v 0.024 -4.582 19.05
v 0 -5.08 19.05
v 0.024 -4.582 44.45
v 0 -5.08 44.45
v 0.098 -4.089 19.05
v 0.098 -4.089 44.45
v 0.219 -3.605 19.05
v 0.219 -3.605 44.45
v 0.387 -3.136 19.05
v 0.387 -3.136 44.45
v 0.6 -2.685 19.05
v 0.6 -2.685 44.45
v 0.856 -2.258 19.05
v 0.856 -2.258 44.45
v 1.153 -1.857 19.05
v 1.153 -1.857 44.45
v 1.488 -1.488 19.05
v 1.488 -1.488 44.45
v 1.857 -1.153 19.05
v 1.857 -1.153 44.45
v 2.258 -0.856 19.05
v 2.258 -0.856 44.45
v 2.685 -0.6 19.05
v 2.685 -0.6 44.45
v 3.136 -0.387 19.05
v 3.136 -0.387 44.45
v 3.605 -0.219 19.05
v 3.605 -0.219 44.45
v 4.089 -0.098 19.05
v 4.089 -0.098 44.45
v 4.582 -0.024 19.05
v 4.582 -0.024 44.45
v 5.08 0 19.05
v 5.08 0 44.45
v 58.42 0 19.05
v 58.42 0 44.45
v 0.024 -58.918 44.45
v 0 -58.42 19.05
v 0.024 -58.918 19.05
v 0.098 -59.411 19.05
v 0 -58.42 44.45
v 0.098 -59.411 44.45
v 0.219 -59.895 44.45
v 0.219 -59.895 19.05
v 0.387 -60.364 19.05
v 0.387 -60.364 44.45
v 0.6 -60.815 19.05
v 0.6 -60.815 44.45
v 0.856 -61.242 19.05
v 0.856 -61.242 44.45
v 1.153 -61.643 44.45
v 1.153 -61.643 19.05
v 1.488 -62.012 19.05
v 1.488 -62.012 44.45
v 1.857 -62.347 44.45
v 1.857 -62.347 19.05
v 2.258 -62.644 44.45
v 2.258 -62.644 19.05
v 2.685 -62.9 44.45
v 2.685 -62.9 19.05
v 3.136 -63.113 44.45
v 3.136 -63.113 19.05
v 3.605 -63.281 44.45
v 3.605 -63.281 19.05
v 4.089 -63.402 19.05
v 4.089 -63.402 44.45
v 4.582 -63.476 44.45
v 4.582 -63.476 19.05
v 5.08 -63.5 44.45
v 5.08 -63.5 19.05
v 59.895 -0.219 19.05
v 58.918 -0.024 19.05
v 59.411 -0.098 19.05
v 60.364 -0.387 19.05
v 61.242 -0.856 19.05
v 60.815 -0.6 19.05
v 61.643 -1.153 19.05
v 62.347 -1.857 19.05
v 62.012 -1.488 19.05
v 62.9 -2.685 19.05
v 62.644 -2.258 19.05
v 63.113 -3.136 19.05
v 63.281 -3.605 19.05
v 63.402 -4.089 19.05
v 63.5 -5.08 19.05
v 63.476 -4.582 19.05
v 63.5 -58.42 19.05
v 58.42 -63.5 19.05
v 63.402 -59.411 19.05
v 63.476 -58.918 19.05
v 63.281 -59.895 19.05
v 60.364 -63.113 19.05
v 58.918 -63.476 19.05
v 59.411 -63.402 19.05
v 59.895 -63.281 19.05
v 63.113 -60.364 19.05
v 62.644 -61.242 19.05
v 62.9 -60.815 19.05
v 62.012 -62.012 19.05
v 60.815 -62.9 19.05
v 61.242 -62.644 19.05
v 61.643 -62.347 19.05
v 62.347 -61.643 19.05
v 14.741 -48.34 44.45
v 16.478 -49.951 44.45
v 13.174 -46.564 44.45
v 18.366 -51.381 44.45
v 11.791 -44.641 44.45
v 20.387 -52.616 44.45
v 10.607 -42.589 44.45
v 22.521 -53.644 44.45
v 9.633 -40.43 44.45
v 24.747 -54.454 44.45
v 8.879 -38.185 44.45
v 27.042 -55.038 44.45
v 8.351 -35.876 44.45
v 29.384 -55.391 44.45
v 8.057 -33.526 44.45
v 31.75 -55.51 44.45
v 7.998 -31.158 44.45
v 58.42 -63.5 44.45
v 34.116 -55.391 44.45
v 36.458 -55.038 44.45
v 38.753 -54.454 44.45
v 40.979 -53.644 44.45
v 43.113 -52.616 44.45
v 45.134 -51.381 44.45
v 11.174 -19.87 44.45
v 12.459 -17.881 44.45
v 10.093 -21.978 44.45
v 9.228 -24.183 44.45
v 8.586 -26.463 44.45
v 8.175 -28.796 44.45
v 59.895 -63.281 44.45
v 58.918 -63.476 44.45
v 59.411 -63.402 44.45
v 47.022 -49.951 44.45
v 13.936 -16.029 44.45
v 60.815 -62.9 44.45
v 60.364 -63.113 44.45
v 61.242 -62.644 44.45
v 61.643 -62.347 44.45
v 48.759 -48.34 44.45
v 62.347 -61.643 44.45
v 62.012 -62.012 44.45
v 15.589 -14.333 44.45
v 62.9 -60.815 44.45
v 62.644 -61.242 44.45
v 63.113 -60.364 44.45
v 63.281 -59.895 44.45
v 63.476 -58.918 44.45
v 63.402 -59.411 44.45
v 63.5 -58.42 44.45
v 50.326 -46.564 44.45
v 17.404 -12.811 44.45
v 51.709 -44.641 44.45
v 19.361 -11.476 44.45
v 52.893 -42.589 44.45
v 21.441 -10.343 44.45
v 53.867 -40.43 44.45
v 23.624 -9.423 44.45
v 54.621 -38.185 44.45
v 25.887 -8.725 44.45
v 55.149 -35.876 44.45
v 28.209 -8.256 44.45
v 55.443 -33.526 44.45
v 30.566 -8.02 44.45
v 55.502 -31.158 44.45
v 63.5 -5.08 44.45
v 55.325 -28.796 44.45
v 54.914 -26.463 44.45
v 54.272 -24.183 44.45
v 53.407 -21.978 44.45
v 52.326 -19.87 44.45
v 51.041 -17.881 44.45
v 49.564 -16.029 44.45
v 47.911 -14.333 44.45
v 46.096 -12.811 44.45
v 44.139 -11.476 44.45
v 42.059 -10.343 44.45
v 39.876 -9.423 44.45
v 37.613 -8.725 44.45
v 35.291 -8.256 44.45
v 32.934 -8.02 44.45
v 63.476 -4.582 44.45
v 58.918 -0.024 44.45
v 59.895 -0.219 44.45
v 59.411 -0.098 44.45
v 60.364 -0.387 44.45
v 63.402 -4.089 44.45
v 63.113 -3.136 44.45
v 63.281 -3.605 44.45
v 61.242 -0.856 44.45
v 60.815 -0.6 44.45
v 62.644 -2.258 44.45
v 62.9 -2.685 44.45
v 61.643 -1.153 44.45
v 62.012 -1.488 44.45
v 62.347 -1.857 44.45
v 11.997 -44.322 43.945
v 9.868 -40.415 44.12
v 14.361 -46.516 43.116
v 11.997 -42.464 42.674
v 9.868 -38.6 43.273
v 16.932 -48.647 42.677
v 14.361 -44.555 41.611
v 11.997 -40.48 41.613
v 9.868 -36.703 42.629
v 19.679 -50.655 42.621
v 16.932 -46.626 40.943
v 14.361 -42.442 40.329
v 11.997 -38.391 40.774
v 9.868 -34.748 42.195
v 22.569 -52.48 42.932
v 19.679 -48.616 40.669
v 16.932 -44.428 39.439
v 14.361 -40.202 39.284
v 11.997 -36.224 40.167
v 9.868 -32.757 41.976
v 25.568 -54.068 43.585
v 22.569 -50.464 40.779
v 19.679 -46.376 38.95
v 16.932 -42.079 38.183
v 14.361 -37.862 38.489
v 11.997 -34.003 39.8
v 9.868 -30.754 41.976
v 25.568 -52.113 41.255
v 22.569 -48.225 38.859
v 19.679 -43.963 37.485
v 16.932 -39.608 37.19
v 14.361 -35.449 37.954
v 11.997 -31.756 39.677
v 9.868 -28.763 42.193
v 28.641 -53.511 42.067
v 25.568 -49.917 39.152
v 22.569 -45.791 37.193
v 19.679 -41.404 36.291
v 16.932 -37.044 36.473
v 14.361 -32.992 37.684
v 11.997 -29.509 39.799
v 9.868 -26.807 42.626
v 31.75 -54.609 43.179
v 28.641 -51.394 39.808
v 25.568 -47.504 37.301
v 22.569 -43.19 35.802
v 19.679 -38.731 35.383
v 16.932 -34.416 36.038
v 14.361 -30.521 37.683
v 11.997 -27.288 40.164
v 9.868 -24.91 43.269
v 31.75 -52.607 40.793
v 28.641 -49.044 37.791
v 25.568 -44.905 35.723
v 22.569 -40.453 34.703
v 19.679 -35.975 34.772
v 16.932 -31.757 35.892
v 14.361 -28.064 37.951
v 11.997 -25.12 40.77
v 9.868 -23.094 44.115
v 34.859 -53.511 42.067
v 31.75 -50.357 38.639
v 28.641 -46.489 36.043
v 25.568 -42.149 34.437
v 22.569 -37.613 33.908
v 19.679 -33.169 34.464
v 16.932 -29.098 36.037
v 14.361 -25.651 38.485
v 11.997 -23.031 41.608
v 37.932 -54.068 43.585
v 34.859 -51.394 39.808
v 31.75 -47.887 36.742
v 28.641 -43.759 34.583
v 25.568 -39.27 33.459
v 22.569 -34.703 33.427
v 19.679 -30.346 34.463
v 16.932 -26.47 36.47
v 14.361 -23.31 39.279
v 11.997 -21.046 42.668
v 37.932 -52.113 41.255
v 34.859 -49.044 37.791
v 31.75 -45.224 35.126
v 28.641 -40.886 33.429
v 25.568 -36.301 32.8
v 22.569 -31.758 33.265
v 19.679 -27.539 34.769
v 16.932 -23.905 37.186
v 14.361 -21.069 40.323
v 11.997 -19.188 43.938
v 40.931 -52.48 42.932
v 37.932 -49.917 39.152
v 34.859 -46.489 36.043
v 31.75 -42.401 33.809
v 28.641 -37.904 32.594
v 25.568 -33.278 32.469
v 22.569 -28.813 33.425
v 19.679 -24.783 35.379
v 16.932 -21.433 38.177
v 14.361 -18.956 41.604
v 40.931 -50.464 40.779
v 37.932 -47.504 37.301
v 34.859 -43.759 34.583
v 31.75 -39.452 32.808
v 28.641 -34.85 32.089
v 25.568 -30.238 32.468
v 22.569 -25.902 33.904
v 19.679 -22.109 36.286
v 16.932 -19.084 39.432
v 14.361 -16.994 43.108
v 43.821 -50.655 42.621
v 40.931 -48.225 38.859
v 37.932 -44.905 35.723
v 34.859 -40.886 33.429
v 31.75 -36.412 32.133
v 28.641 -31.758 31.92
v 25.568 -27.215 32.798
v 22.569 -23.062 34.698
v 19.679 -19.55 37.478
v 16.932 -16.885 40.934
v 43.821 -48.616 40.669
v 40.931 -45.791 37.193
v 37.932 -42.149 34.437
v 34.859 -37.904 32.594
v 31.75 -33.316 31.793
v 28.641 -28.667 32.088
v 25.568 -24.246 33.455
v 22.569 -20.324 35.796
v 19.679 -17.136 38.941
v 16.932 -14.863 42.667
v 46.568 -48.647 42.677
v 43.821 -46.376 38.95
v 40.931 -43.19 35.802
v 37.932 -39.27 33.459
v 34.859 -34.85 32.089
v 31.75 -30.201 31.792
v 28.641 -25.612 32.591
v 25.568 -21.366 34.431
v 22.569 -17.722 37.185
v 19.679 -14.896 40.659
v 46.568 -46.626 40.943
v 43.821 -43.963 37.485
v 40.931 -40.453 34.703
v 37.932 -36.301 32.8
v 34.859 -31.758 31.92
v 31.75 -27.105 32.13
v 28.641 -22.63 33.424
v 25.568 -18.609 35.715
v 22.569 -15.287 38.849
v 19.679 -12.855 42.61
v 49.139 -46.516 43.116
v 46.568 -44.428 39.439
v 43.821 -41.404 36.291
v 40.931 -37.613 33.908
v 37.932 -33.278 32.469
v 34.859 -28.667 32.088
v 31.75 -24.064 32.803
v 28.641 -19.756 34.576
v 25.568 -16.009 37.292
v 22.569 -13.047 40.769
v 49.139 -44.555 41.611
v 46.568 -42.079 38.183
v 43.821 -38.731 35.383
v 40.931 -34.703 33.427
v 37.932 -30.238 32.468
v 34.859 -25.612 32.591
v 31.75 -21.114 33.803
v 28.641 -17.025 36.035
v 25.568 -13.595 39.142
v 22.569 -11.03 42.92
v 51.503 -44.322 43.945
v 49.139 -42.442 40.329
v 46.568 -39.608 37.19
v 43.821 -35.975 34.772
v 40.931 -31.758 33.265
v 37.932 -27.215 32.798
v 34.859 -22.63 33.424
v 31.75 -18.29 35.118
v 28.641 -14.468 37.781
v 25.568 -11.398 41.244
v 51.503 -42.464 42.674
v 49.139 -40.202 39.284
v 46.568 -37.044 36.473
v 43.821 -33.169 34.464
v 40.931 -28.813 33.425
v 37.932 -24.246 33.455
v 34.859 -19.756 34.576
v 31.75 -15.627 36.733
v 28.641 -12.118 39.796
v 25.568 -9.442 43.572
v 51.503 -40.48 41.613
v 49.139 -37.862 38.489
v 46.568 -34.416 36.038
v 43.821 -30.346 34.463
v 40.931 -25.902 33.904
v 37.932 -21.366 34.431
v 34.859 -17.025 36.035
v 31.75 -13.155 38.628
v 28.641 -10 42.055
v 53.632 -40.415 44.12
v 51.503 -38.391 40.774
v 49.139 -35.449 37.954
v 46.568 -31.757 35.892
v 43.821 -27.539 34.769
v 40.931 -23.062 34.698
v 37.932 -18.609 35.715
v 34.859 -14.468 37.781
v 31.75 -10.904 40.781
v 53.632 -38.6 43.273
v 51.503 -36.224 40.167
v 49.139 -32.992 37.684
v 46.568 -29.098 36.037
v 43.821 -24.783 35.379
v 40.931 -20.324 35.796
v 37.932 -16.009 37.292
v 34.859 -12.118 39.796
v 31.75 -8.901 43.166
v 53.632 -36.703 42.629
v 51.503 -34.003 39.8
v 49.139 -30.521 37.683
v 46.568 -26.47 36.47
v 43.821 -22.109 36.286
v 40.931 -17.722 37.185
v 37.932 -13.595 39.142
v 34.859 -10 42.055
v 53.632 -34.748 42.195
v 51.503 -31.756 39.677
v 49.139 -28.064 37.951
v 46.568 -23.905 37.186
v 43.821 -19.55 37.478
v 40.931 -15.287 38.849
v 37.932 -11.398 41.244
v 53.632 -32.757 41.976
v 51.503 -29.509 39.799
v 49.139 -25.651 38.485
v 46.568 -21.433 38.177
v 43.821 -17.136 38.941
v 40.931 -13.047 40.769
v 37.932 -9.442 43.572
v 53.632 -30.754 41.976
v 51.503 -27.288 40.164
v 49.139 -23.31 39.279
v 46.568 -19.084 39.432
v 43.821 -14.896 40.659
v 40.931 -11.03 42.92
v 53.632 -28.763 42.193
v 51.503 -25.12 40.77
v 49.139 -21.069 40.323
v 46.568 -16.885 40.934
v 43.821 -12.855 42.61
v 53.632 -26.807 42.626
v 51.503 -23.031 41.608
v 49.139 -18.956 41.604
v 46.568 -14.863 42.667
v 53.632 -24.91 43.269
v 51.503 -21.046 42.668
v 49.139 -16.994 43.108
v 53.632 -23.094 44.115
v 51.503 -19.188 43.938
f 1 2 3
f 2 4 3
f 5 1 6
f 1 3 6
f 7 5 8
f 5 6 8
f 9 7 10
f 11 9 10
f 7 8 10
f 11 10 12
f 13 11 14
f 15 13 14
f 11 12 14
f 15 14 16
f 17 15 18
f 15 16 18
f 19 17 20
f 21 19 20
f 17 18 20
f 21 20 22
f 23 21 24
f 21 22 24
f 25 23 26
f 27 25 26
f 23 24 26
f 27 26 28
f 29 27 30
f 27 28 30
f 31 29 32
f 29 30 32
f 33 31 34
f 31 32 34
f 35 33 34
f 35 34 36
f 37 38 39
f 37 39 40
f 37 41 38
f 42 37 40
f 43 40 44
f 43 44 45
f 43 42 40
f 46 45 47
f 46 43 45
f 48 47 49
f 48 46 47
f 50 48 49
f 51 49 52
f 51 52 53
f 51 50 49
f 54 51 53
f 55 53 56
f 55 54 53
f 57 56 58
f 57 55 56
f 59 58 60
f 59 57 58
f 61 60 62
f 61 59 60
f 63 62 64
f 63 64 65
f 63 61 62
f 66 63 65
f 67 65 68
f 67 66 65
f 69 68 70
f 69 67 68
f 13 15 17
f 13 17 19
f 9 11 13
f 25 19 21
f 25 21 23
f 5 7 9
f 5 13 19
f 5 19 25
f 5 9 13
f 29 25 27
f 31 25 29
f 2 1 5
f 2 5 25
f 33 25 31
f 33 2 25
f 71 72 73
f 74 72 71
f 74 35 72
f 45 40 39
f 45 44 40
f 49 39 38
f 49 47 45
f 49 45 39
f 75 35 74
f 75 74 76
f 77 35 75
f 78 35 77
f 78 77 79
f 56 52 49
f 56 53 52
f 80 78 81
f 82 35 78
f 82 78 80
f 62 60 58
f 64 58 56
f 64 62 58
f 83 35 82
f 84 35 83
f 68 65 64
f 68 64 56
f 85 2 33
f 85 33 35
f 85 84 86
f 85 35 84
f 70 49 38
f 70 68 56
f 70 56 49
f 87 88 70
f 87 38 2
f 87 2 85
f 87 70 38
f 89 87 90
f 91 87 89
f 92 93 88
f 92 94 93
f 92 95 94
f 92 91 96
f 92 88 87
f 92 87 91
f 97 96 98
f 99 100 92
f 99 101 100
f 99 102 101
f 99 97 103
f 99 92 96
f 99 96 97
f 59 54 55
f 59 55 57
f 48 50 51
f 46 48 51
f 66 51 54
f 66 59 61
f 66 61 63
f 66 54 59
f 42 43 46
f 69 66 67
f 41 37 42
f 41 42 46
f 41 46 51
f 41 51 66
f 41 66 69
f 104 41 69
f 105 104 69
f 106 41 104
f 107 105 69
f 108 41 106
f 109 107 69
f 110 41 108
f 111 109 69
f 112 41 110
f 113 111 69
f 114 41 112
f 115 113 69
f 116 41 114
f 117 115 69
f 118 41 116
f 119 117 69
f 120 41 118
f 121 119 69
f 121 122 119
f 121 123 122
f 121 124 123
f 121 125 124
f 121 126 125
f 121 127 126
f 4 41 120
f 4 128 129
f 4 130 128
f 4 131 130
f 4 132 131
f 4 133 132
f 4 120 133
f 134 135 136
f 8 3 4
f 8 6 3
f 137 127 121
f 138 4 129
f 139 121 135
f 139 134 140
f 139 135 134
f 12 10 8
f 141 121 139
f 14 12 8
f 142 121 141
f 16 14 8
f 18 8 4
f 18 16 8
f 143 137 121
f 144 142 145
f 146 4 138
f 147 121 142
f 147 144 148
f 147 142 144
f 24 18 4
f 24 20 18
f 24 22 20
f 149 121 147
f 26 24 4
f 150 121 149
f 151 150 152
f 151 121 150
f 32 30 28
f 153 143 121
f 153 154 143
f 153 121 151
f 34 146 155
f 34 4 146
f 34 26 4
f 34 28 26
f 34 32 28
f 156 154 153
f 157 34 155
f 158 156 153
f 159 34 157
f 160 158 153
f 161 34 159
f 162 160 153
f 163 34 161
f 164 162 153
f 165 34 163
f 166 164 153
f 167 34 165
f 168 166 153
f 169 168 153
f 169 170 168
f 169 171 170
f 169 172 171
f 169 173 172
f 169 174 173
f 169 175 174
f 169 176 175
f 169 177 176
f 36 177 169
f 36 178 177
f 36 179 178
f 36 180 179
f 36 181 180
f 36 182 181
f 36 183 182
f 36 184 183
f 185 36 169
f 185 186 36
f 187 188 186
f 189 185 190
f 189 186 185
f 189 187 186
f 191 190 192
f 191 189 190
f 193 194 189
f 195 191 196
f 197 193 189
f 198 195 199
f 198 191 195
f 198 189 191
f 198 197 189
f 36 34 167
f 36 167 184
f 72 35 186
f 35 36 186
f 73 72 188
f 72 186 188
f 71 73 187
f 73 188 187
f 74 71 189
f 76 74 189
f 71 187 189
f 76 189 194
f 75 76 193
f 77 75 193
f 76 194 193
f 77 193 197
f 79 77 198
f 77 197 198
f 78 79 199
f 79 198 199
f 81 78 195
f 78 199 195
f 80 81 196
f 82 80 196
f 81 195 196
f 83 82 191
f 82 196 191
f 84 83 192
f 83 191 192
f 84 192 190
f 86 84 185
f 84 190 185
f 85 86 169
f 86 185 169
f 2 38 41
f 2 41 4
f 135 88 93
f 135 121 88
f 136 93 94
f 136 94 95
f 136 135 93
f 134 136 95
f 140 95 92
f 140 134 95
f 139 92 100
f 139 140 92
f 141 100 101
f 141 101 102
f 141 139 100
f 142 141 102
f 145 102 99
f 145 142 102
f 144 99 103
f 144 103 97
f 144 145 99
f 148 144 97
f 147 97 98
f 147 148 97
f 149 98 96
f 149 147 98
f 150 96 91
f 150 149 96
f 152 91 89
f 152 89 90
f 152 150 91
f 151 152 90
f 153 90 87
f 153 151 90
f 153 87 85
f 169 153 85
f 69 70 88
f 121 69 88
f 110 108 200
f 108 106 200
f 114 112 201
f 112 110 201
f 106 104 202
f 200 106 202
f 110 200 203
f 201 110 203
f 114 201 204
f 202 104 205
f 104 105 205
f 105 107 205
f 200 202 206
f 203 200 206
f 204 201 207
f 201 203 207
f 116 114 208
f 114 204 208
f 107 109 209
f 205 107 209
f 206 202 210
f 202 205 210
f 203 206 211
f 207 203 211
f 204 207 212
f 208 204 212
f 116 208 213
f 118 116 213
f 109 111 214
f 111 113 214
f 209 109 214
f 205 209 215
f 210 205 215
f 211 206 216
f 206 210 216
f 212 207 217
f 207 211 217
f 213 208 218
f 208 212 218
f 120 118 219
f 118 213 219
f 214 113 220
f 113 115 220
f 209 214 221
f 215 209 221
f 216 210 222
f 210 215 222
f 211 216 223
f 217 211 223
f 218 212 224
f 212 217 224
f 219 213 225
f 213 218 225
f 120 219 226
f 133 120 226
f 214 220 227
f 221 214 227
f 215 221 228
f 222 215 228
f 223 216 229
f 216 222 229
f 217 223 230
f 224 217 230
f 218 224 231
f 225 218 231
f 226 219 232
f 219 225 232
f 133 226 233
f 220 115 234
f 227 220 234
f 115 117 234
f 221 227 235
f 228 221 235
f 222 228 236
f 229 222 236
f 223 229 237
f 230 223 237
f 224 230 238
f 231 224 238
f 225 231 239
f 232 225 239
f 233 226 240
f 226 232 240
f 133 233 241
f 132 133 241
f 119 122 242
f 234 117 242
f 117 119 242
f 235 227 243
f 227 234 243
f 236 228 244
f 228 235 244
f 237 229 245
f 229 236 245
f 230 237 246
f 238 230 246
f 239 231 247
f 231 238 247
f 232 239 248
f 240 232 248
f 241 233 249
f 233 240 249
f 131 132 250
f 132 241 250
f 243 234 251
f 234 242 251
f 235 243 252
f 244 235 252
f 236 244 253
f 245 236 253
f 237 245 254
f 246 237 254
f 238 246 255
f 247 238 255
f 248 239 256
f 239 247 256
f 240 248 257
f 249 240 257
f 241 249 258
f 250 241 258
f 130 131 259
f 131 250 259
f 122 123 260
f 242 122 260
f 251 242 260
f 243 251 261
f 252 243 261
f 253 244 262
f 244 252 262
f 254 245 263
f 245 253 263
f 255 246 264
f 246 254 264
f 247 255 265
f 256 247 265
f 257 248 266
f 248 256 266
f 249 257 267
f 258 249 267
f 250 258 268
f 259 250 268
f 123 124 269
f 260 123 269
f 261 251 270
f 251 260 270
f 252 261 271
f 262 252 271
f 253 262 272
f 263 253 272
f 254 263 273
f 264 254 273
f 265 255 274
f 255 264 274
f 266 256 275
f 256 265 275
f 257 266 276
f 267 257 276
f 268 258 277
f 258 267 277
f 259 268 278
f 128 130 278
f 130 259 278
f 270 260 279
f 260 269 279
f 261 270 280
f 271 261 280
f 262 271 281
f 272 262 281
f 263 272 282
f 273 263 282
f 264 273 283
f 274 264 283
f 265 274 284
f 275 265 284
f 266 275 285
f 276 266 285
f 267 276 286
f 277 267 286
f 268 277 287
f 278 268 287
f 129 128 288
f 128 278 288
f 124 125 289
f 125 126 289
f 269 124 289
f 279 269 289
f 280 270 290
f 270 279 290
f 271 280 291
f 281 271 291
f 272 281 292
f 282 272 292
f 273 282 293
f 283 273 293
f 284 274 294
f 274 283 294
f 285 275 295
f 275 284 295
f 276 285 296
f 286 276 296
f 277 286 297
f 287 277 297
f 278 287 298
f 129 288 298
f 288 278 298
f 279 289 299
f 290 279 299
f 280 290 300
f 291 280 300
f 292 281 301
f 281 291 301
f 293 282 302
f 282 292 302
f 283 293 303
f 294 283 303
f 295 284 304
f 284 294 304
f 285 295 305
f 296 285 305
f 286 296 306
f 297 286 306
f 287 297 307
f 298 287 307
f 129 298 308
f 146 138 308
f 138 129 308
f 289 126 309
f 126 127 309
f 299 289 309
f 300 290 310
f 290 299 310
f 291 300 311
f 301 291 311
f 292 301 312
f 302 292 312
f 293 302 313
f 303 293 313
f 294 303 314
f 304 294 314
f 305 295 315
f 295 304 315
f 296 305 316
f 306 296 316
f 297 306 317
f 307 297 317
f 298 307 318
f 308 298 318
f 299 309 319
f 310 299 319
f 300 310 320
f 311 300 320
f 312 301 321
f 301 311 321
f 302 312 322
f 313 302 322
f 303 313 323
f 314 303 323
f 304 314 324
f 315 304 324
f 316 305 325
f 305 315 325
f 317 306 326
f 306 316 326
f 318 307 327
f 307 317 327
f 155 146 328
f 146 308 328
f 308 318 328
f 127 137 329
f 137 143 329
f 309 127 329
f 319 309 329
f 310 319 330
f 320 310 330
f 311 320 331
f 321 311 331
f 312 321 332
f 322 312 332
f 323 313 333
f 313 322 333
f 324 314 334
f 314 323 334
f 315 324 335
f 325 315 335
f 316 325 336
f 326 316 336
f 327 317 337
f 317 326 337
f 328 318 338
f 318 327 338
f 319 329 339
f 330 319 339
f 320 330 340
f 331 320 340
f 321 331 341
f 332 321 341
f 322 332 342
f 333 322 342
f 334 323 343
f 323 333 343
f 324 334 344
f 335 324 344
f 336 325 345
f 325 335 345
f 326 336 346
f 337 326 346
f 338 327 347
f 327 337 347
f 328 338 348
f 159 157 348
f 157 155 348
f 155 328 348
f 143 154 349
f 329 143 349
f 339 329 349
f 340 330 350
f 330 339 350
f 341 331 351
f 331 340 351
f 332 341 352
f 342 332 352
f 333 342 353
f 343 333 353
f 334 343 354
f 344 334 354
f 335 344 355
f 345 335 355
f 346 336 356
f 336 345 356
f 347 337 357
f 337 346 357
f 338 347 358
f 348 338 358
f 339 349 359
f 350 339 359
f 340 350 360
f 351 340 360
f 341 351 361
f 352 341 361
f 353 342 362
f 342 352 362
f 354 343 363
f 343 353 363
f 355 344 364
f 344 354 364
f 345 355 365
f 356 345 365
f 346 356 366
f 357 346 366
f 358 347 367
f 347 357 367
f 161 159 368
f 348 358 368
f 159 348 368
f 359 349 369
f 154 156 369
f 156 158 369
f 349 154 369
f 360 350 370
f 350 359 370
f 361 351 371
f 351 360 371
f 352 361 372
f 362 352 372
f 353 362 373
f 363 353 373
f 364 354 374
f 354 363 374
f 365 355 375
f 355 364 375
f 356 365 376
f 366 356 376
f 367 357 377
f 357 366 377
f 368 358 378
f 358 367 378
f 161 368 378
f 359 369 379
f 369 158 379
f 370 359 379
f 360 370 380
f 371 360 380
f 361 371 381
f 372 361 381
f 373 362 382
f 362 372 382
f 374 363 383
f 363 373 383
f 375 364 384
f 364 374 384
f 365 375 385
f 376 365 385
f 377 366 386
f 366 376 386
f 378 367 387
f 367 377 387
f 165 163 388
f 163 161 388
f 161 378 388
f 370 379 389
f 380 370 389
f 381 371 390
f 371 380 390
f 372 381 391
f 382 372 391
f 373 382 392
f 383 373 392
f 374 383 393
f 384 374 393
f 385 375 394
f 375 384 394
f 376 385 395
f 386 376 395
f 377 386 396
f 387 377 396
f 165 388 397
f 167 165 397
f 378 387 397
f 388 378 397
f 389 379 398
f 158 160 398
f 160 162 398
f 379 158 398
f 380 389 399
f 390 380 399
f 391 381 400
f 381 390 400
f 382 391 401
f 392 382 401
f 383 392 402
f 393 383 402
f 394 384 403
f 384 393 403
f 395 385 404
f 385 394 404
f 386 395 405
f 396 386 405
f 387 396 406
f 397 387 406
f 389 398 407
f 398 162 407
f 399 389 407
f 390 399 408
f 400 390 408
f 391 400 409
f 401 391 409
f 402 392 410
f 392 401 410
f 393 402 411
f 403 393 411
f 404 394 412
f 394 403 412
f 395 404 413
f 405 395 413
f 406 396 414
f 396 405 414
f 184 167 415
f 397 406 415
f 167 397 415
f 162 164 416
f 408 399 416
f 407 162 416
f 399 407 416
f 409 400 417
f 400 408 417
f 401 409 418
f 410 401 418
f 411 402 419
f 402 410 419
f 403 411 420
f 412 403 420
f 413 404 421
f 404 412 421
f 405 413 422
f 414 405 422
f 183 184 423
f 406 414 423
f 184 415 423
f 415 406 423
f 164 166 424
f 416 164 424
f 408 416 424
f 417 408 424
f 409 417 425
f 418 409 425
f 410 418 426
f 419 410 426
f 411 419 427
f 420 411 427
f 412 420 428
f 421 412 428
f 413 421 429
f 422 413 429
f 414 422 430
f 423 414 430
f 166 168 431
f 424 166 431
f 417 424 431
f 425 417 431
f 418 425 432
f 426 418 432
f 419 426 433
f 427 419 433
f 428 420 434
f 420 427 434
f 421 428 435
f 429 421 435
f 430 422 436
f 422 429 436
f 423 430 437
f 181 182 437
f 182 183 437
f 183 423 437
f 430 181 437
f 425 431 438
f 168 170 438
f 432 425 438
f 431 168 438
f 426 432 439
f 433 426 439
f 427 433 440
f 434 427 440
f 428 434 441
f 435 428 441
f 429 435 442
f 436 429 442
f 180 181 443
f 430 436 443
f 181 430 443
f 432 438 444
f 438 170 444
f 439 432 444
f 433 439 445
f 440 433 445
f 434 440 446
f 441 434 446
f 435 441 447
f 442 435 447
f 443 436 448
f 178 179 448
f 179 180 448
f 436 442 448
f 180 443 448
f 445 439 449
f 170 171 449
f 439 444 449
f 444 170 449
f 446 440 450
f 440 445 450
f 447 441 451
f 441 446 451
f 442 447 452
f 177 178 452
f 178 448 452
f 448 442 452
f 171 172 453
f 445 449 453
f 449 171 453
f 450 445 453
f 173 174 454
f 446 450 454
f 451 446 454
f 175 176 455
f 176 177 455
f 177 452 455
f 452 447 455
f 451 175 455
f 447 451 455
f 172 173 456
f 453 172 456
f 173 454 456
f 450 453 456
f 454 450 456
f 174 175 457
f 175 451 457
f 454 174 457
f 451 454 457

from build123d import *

# Parameters (mm, degrees)
F0_W     = 63.5
F0_H     = 63.5
F1_DEPTH = 44.45
F5_W     = 63.5
F5_H     = 19.05
F6_DEPTH = 63.501
F7_R     = 5.08


with BuildPart() as f1:
    # F0 (on Top) → F1 (new body)
    with BuildSketch(Plane.XY):
        with Locations((31.75, -31.75)):
            Rectangle(F0_W, F0_H)
    extrude(amount=F1_DEPTH)

    # F3 (on offset) → F4 (revolve, cut)
    with BuildSketch(Plane.XY.offset(60.325)):
        with BuildLine():
            Line((60.325, -31.75), (3.175, -31.75))
            ThreePointArc((3.175, -31.75), (31.75, -60.325), (60.325, -31.75))
        make_face()
    revolve(axis=Axis((31.75, -31.75, 60.325), (1, 0, 0)), mode=Mode.SUBTRACT)

    # F5 (on face) → F6 (cut, through all)
    with BuildSketch(Plane.XZ.offset(63.5)):
        with Locations((31.75, 9.525)):
            Rectangle(F5_W, F5_H)
    extrude(amount=-F6_DEPTH, mode=Mode.SUBTRACT)

    # F7
    f7_edges = [f1.edges().sort_by_distance(p)[0] for p in [
        (63.5, -63.5, 31.75),
        (63.5, 0, 31.75),
        (0, 0, 31.75),
        (0, -63.5, 31.75),
    ]]
    fillet(f7_edges, radius=F7_R)


solid = f1.part
